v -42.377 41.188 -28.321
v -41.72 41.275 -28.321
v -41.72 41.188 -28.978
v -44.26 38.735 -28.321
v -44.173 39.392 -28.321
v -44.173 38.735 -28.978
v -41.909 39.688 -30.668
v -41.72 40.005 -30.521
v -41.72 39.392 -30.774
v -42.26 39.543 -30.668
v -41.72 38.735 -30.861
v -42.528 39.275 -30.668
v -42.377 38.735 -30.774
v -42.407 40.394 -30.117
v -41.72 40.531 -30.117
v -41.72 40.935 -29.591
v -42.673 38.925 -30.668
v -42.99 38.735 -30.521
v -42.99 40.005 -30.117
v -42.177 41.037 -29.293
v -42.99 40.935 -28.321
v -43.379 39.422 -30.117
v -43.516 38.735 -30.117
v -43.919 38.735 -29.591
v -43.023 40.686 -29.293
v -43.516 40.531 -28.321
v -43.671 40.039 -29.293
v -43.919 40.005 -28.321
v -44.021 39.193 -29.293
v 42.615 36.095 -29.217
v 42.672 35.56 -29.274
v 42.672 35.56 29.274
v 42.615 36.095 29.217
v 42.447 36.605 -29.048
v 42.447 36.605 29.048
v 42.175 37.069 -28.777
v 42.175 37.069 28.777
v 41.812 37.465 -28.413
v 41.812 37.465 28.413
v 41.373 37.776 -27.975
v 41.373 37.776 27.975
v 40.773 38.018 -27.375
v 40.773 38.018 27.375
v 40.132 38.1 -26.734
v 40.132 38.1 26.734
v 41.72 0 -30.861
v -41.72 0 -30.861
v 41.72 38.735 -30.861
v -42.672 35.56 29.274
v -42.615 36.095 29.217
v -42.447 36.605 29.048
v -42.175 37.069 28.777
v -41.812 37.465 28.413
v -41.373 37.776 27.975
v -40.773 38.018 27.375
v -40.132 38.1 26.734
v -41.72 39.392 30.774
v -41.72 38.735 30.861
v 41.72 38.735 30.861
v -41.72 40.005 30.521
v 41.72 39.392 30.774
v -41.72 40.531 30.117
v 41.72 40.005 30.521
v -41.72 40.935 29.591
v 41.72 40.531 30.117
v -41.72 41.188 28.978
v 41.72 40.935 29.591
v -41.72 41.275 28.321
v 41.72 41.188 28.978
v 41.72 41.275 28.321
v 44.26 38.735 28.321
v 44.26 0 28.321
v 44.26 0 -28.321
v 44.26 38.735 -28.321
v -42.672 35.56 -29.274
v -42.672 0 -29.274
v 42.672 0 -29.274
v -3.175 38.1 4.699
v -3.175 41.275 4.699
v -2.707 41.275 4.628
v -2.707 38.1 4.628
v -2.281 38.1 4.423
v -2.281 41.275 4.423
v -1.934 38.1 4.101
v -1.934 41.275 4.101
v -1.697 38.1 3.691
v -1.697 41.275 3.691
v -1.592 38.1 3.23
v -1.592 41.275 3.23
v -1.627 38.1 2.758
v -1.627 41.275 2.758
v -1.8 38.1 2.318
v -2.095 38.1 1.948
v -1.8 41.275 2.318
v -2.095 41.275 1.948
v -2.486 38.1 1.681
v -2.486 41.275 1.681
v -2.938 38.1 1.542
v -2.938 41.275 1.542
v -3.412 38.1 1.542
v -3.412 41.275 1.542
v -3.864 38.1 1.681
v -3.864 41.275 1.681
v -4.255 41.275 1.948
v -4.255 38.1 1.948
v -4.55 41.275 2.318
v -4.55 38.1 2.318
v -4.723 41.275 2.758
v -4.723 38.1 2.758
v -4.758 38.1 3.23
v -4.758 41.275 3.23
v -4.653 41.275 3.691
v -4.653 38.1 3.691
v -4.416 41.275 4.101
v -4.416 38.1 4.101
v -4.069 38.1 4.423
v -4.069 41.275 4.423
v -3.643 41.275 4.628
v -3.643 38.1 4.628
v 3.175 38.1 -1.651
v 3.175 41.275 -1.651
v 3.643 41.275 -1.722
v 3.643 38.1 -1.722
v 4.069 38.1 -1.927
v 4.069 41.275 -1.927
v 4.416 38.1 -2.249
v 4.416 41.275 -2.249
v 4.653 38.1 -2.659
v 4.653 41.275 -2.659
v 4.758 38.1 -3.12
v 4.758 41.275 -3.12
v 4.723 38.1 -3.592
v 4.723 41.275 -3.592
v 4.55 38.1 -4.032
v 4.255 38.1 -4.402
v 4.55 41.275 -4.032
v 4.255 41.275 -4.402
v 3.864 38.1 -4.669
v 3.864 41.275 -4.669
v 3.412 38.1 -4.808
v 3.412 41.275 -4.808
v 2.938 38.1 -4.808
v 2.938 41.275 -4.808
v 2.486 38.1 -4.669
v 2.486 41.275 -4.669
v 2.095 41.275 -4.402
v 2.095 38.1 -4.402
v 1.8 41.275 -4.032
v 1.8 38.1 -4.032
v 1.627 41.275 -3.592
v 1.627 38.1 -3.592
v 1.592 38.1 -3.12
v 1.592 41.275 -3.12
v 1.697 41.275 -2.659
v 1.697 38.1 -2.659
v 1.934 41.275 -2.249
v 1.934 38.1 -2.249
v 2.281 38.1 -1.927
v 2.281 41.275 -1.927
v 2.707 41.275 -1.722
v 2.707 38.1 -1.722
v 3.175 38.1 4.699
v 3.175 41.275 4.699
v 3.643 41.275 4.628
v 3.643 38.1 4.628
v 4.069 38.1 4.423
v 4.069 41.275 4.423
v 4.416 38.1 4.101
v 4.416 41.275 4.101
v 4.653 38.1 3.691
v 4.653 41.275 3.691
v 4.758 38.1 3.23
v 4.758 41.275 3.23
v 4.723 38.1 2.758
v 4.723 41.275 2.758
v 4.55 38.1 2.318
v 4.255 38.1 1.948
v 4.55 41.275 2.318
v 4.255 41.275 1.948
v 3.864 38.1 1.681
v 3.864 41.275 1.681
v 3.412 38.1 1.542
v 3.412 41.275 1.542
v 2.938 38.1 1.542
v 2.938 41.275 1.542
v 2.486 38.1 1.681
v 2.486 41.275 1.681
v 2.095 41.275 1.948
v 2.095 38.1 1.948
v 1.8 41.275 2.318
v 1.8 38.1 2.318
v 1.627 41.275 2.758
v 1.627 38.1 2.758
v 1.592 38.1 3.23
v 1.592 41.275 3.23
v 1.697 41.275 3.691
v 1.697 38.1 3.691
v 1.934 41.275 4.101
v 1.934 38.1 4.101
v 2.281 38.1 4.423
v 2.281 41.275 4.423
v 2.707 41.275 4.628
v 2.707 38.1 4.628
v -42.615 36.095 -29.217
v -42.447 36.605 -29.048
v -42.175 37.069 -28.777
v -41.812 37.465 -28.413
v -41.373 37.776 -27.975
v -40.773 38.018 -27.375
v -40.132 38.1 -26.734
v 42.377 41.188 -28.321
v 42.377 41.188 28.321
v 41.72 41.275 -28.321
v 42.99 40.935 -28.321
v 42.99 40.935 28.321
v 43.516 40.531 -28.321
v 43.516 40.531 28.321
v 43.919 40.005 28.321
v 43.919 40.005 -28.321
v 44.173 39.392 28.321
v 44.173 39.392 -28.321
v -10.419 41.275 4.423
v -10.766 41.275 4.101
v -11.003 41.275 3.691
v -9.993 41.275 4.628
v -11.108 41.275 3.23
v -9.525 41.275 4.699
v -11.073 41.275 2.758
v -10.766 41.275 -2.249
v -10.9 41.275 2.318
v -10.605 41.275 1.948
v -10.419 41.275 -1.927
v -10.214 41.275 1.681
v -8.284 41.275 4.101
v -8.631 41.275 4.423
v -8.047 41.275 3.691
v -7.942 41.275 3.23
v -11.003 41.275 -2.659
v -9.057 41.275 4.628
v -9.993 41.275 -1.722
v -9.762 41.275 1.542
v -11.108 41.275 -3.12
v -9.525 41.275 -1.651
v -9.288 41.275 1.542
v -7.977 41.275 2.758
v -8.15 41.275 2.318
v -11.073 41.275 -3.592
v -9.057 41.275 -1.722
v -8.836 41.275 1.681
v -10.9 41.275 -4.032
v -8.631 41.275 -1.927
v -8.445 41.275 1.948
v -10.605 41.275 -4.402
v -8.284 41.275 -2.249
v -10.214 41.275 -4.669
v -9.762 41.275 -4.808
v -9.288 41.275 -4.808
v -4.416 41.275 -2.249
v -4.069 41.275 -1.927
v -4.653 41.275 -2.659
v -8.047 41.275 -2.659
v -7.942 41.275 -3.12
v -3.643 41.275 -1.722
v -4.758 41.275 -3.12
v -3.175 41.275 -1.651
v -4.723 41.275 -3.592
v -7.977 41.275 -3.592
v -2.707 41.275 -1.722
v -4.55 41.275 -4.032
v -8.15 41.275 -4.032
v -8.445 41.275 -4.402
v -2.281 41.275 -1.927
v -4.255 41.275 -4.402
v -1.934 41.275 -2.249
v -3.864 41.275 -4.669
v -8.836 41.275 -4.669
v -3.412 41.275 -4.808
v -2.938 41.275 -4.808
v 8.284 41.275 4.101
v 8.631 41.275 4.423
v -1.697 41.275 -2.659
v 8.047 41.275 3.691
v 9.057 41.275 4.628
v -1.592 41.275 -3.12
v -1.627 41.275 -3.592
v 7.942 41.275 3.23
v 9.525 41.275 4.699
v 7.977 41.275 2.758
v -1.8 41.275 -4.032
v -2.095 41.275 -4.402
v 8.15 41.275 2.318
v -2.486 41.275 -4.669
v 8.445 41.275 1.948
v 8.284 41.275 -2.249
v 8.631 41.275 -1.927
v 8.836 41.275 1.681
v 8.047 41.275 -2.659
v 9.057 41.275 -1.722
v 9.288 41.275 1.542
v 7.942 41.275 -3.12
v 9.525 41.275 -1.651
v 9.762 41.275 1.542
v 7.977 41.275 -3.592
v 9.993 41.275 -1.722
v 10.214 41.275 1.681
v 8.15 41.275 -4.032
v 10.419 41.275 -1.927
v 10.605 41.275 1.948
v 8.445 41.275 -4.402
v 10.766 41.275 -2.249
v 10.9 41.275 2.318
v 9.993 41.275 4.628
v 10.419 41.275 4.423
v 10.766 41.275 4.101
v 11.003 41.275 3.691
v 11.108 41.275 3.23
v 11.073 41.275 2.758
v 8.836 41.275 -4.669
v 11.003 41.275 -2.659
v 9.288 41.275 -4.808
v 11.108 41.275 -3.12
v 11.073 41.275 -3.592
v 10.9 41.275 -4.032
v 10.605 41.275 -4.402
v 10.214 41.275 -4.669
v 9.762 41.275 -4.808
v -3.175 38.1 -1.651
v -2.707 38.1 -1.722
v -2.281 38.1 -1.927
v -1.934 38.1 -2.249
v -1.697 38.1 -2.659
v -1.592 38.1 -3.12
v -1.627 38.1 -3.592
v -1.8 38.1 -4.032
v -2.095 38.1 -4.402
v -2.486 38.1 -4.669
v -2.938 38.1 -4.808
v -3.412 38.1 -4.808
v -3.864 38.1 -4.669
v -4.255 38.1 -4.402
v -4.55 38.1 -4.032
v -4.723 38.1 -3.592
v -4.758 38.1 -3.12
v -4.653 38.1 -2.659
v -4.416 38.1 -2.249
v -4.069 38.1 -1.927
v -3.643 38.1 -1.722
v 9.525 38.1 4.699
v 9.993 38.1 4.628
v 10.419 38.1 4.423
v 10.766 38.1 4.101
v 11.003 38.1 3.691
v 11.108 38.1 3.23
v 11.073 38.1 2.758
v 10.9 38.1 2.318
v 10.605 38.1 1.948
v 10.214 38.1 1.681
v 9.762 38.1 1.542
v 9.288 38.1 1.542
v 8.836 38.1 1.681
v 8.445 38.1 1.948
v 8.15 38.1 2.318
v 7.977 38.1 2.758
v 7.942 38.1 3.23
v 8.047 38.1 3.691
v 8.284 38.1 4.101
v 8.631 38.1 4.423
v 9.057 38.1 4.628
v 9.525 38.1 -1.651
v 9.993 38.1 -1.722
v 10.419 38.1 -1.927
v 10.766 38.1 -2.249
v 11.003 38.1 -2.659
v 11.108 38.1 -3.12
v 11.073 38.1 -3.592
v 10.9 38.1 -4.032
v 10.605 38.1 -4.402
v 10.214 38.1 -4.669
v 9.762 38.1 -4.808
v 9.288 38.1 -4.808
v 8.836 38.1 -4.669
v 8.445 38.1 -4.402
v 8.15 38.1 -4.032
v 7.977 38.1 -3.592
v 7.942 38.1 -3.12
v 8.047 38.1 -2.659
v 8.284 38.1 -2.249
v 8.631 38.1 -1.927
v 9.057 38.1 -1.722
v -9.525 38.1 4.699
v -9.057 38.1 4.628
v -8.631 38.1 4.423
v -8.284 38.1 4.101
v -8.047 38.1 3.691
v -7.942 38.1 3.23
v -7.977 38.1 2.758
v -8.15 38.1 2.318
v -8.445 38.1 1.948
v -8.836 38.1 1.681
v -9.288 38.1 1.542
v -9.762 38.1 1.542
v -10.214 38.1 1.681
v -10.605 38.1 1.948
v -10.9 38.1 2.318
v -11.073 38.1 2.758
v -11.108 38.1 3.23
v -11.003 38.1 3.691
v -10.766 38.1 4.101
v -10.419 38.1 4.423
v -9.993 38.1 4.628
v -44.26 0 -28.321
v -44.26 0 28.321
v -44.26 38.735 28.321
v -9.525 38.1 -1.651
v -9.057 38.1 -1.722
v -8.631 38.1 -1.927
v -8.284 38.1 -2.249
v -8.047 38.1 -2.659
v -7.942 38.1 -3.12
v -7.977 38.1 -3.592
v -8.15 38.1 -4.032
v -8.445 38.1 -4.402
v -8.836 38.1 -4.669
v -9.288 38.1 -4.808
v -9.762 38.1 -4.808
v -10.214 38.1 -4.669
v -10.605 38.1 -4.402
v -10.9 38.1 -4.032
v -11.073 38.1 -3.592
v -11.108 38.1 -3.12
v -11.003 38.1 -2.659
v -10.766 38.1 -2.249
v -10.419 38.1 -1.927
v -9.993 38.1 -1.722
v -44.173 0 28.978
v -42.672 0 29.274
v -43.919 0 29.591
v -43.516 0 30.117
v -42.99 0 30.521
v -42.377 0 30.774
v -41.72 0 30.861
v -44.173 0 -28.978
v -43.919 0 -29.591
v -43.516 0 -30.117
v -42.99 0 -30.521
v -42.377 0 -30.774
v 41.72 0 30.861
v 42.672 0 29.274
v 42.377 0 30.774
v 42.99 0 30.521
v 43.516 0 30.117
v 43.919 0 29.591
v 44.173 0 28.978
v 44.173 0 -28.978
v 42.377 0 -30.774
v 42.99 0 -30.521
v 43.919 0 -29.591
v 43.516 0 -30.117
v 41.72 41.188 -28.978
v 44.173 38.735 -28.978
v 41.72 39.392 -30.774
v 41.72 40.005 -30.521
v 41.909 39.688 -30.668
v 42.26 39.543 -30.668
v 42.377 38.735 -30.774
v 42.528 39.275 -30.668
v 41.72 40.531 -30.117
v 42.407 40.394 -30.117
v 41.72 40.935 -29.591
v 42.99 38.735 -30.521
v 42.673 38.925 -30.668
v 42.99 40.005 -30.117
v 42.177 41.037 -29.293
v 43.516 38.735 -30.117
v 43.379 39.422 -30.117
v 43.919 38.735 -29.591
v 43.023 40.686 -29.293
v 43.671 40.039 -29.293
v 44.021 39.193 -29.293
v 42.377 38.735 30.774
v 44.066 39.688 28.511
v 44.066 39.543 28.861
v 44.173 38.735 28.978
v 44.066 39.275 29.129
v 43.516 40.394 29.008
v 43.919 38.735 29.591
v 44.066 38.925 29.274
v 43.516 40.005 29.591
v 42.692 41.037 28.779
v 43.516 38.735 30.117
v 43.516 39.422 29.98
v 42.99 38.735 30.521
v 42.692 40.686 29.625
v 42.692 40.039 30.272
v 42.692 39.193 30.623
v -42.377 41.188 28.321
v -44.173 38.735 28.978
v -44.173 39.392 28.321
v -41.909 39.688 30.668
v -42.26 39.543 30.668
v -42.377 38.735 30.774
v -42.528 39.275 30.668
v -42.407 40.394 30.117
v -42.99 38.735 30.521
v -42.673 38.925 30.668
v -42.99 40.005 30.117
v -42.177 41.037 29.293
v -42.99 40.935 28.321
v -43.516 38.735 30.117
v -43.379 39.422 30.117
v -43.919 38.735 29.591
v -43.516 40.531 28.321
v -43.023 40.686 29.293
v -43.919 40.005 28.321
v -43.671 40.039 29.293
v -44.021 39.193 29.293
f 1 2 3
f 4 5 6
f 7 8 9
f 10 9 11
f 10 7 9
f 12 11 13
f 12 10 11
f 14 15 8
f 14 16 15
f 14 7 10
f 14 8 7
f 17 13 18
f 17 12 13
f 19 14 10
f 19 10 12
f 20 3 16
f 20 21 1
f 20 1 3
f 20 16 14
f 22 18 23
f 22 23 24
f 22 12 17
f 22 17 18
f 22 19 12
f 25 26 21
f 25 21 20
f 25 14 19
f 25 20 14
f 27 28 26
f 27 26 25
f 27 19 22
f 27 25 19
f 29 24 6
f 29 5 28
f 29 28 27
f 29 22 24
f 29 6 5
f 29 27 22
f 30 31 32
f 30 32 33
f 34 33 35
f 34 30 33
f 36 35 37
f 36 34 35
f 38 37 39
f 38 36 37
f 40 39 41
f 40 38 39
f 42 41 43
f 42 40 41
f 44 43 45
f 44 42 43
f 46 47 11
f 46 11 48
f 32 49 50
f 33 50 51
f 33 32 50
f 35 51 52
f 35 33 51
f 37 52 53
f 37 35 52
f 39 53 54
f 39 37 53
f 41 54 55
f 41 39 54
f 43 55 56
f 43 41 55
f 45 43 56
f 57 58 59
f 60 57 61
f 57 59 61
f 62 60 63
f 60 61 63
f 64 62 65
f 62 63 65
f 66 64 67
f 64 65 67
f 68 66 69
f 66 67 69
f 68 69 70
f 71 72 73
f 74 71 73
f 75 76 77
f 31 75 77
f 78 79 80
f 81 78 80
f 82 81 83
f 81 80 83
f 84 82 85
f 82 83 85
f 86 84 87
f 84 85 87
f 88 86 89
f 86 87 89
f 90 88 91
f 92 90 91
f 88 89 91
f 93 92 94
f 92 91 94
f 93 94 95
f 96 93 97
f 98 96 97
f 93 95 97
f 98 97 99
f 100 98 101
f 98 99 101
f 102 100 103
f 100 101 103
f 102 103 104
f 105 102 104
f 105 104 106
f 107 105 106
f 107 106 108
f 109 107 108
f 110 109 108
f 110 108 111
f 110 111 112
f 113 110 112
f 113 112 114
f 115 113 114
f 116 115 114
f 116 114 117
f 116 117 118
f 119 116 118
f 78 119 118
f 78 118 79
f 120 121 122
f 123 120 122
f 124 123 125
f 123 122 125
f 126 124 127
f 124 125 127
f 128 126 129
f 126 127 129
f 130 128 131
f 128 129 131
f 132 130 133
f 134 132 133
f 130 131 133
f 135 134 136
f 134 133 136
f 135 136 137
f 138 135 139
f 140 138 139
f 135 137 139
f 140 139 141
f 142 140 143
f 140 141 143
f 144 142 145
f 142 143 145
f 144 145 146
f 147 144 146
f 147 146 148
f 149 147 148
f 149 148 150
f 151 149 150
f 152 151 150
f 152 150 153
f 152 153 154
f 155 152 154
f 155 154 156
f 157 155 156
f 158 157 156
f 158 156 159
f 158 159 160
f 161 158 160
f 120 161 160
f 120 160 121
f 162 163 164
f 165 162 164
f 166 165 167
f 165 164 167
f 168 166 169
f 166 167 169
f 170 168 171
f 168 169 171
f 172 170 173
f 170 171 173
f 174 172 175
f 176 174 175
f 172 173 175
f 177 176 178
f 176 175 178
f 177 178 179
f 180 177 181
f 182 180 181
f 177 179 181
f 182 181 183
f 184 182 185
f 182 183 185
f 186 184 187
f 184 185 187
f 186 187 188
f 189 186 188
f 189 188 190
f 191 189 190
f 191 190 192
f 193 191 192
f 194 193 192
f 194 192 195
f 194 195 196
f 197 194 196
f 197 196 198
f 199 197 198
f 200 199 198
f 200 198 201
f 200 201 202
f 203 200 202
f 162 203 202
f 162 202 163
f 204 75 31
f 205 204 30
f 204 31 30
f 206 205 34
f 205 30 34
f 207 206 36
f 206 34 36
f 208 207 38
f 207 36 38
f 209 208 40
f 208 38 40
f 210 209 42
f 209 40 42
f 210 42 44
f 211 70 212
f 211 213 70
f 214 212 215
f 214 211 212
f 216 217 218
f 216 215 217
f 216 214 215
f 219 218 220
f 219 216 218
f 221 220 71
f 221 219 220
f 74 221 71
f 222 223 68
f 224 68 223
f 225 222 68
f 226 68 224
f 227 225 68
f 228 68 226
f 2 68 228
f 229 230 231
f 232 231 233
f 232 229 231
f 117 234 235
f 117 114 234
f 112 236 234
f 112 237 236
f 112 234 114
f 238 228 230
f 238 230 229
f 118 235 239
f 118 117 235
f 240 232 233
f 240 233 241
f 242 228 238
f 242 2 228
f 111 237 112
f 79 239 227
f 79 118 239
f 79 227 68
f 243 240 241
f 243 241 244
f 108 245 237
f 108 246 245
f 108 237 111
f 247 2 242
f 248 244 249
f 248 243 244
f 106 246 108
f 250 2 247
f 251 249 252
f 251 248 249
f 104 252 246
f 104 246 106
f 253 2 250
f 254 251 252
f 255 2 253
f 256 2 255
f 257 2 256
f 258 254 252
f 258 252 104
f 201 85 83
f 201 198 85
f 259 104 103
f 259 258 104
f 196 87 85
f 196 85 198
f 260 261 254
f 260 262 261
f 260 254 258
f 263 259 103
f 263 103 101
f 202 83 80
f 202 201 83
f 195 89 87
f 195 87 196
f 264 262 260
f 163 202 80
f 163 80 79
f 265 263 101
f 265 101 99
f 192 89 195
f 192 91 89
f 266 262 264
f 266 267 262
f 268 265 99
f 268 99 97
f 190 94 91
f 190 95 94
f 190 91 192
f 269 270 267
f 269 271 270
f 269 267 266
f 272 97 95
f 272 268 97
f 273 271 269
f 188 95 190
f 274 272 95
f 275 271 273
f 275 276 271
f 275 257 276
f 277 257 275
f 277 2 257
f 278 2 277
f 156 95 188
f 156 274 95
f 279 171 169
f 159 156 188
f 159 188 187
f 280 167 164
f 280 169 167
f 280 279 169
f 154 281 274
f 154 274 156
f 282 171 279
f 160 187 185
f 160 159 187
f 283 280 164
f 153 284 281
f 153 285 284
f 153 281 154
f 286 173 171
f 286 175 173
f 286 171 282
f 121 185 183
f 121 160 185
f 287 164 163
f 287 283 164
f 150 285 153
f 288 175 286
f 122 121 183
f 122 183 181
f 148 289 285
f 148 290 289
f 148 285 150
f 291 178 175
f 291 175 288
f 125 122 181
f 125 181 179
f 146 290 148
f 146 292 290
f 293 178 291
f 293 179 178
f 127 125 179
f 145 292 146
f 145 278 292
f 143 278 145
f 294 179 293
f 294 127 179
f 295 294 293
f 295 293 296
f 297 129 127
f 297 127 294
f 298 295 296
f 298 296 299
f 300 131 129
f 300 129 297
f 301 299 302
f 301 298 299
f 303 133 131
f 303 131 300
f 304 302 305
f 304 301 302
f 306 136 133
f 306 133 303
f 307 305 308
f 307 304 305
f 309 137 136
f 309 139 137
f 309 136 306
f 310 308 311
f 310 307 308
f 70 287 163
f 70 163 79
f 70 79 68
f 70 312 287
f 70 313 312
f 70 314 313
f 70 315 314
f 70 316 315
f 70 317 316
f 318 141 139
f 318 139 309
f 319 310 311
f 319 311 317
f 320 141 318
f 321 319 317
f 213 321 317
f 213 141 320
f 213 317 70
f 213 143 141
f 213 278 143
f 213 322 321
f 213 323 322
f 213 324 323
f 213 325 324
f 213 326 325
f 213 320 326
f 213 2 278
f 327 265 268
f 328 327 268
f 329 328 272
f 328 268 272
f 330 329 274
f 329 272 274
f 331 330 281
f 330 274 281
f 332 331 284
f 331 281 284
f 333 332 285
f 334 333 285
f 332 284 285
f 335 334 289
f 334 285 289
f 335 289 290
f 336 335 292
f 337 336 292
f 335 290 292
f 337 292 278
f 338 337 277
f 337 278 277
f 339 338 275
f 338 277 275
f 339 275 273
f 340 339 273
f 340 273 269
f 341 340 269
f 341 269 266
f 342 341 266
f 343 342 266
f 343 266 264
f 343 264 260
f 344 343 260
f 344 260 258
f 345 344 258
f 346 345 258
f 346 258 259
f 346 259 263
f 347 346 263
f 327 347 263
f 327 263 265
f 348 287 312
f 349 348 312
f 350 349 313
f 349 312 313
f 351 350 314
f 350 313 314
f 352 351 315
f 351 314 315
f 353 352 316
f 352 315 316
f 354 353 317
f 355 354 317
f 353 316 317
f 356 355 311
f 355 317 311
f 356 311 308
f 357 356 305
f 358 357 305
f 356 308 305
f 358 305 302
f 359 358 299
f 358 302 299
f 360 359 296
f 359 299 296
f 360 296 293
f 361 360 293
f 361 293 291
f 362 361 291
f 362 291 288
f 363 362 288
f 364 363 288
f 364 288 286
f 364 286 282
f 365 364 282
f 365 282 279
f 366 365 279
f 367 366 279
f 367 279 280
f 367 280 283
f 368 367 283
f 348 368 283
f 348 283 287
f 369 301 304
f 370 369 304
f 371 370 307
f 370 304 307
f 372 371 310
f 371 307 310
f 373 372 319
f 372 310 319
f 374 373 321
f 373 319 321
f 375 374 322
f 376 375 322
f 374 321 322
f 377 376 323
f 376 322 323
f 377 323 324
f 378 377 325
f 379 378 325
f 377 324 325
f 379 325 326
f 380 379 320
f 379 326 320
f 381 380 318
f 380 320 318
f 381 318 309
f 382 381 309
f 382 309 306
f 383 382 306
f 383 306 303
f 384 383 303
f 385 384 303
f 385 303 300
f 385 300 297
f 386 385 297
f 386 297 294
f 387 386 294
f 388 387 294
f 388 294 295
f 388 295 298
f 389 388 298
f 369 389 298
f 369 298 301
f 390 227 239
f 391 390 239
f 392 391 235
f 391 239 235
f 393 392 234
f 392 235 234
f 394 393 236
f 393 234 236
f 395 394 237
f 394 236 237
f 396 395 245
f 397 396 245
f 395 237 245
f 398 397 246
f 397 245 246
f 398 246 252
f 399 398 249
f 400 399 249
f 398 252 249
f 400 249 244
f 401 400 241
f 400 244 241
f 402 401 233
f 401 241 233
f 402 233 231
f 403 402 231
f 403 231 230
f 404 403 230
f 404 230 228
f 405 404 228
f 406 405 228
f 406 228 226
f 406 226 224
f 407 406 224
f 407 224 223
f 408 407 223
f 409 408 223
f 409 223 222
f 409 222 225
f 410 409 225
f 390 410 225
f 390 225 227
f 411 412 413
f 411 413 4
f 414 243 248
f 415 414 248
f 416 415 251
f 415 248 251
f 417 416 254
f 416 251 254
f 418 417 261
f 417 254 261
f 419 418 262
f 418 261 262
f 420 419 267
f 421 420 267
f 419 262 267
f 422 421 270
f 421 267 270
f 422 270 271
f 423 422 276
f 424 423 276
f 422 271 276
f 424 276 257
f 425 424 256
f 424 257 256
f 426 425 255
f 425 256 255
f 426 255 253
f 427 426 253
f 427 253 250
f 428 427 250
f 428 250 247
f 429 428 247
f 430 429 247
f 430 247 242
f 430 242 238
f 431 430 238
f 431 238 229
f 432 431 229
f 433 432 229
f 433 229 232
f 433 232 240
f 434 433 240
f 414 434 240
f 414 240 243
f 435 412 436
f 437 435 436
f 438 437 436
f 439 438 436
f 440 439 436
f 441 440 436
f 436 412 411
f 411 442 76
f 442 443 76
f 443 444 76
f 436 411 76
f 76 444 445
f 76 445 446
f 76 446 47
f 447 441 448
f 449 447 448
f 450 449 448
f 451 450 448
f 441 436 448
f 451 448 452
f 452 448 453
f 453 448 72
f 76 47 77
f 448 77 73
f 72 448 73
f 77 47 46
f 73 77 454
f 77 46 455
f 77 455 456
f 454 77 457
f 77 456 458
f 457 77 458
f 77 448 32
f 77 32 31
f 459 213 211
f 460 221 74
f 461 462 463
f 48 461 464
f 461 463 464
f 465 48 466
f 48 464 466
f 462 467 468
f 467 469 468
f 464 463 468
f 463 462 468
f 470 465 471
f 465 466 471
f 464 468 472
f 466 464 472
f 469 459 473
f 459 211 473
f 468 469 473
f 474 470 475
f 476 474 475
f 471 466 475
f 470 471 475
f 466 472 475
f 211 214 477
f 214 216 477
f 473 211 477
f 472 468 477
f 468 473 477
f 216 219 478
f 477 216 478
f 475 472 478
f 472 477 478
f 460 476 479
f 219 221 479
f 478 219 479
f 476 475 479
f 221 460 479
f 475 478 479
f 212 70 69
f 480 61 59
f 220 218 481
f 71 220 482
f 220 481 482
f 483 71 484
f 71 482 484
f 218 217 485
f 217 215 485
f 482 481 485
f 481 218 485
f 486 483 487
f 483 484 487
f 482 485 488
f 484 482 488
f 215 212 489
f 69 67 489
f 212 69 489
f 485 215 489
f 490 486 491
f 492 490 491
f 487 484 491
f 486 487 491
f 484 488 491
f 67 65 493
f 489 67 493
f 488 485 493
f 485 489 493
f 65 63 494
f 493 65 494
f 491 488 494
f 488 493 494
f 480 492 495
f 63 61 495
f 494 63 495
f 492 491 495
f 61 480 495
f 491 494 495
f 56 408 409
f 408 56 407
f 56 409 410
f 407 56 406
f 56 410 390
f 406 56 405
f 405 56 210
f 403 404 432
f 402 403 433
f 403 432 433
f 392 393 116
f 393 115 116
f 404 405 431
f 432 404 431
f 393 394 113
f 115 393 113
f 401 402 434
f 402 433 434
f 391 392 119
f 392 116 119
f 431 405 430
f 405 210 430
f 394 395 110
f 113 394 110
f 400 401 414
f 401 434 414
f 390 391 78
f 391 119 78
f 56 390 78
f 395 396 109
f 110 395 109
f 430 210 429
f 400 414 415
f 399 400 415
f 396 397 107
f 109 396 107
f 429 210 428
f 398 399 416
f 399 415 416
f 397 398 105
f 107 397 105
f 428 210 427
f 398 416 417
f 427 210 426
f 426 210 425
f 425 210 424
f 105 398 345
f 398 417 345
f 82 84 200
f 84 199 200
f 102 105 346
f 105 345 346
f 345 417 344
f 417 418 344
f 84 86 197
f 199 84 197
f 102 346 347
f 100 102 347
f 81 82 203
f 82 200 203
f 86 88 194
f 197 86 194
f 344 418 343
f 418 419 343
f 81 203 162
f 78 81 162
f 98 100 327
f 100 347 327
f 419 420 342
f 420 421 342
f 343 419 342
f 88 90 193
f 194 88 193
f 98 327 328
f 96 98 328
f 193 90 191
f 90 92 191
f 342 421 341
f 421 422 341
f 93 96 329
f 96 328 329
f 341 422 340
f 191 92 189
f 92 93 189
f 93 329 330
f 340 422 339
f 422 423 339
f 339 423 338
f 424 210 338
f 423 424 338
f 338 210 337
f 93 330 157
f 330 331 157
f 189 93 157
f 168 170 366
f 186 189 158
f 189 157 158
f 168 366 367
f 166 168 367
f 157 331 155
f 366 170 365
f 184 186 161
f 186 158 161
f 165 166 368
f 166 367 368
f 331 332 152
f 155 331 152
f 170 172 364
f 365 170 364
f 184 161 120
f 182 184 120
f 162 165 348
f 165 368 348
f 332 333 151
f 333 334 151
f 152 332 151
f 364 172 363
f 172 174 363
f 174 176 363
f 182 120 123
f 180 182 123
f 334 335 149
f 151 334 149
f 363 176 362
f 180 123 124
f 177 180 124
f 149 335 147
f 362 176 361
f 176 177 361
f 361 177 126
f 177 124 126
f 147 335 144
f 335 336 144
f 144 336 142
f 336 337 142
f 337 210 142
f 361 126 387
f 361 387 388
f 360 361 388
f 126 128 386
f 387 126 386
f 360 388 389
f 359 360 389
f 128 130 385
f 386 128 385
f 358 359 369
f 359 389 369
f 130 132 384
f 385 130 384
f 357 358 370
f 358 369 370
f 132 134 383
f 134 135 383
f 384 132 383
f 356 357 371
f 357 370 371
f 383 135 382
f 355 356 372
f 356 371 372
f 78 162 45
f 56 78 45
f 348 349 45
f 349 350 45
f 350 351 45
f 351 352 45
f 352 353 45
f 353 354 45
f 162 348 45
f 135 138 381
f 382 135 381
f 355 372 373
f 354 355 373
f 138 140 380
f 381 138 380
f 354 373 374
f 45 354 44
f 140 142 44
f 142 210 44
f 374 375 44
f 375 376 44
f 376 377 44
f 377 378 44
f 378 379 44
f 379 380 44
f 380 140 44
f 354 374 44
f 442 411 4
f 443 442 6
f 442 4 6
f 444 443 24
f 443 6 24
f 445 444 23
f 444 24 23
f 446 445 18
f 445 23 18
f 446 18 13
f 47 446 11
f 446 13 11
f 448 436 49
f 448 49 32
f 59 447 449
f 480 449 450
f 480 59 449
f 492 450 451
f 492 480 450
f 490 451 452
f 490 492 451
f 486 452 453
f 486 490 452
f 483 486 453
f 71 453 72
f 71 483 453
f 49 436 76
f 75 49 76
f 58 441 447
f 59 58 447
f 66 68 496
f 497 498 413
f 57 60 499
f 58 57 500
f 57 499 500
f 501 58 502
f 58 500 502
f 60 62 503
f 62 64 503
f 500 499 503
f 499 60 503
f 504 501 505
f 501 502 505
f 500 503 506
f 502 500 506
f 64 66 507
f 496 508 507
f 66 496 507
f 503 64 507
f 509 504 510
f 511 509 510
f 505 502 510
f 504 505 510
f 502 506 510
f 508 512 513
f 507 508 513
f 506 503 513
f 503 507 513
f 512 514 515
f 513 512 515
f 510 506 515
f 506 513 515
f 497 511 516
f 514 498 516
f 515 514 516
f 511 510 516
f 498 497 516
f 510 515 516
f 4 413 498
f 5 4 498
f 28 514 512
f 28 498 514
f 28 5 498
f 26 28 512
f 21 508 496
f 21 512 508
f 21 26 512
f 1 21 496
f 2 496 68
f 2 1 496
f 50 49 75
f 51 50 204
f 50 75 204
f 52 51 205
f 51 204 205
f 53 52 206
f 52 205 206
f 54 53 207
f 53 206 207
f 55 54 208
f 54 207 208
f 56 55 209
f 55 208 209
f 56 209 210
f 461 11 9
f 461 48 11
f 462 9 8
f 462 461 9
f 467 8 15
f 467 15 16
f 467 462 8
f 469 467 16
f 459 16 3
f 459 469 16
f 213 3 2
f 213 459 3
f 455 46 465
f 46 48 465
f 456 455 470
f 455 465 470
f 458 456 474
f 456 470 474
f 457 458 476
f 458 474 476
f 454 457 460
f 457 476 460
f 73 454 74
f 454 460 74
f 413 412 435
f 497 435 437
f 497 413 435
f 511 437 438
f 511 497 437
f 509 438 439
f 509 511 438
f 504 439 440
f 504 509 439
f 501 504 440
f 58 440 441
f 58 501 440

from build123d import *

# Parameters (mm, degrees)
SKETCH3_W           = 88.519
SKETCH3_H           = 61.722
BOSS_EXTRUDE2_DEPTH = 41.275
SKETCH1_W           = 85.344
SKETCH1_H           = 58.547
CUT_EXTRUDE1_DEPTH  = 38.1
FILLET2_R           = 2.54
SKETCH6_R           = 1.5875
CUT_EXTRUDE4_DEPTH  = 42.275
FILLET3_R           = 2.54


with BuildPart() as part:
    # Sketch3 → Boss-Extrude2 (new body)
    with BuildSketch(Plane(origin=(0, 0, 0), x_dir=(1, 0, 0), z_dir=(0, 1, 0))):
        Rectangle(SKETCH3_W, SKETCH3_H)
    extrude(amount=BOSS_EXTRUDE2_DEPTH)

    # Sketch1 → Cut-Extrude1 (cut)
    with BuildSketch(Plane(origin=(0, 0, 0), x_dir=(1, 0, 0), z_dir=(0, 1, 0))):
        Rectangle(SKETCH1_W, SKETCH1_H)
    extrude(amount=CUT_EXTRUDE1_DEPTH, mode=Mode.SUBTRACT)

    # Fillet2
    fillet2_edges = [part.edges().sort_by_distance(p)[0] for p in [
        (-44.2595, 41.275, 0),
        (0, 41.275, 30.861),
        (44.2595, 41.275, 0),
        (0, 41.275, -30.861),
        (44.2595, 20.6375, 30.861),
        (-44.2595, 20.6375, 30.861),
        (-44.2595, 20.6375, -30.861),
        (44.2595, 20.6375, -30.861),
    ]]
    fillet(fillet2_edges, radius=FILLET2_R)

    # Sketch6 → Cut-Extrude4 (cut, through all)
    with BuildSketch(Plane(origin=(0, 41.275, 0), x_dir=(1, 0, 0), z_dir=(0, 1, 0))):
        with Locations(Location((-9.525, -3.1115, 0), (0, 0, 270))):  # turned: the seam where the file's is
            Circle(SKETCH6_R)
        with Locations(Location((-3.175, -3.1115, 0), (0, 0, 270))):  # turned: the seam where the file's is
            Circle(SKETCH6_R)
        with Locations(Location((3.175, -3.1115, 0), (0, 0, 270))):  # turned: the seam where the file's is
            Circle(SKETCH6_R)
        with Locations(Location((9.525, -3.1115, 0), (0, 0, 270))):  # turned: the seam where the file's is
            Circle(SKETCH6_R)
        with Locations(Location((-9.525, 3.2385, 0), (0, 0, 270))):  # turned: the seam where the file's is
            Circle(SKETCH6_R)
        with Locations(Location((-3.175, 3.2385, 0), (0, 0, 270))):  # turned: the seam where the file's is
            Circle(SKETCH6_R)
        with Locations(Location((3.175, 3.2385, 0), (0, 0, 270))):  # turned: the seam where the file's is
            Circle(SKETCH6_R)
        with Locations(Location((9.525, 3.2385, 0), (0, 0, 270))):  # turned: the seam where the file's is
            Circle(SKETCH6_R)
    extrude(amount=-CUT_EXTRUDE4_DEPTH, mode=Mode.SUBTRACT)

    # Fillet3
    fillet3_edges = [part.edges().sort_by_distance(p)[0] for p in [
        (42.672, 38.1, 0),
        (0, 38.1, -29.2735),
        (-42.672, 38.1, 0),
        (0, 38.1, 29.2735),
    ]]
    fillet(fillet3_edges, radius=FILLET3_R)


solid = part.part
